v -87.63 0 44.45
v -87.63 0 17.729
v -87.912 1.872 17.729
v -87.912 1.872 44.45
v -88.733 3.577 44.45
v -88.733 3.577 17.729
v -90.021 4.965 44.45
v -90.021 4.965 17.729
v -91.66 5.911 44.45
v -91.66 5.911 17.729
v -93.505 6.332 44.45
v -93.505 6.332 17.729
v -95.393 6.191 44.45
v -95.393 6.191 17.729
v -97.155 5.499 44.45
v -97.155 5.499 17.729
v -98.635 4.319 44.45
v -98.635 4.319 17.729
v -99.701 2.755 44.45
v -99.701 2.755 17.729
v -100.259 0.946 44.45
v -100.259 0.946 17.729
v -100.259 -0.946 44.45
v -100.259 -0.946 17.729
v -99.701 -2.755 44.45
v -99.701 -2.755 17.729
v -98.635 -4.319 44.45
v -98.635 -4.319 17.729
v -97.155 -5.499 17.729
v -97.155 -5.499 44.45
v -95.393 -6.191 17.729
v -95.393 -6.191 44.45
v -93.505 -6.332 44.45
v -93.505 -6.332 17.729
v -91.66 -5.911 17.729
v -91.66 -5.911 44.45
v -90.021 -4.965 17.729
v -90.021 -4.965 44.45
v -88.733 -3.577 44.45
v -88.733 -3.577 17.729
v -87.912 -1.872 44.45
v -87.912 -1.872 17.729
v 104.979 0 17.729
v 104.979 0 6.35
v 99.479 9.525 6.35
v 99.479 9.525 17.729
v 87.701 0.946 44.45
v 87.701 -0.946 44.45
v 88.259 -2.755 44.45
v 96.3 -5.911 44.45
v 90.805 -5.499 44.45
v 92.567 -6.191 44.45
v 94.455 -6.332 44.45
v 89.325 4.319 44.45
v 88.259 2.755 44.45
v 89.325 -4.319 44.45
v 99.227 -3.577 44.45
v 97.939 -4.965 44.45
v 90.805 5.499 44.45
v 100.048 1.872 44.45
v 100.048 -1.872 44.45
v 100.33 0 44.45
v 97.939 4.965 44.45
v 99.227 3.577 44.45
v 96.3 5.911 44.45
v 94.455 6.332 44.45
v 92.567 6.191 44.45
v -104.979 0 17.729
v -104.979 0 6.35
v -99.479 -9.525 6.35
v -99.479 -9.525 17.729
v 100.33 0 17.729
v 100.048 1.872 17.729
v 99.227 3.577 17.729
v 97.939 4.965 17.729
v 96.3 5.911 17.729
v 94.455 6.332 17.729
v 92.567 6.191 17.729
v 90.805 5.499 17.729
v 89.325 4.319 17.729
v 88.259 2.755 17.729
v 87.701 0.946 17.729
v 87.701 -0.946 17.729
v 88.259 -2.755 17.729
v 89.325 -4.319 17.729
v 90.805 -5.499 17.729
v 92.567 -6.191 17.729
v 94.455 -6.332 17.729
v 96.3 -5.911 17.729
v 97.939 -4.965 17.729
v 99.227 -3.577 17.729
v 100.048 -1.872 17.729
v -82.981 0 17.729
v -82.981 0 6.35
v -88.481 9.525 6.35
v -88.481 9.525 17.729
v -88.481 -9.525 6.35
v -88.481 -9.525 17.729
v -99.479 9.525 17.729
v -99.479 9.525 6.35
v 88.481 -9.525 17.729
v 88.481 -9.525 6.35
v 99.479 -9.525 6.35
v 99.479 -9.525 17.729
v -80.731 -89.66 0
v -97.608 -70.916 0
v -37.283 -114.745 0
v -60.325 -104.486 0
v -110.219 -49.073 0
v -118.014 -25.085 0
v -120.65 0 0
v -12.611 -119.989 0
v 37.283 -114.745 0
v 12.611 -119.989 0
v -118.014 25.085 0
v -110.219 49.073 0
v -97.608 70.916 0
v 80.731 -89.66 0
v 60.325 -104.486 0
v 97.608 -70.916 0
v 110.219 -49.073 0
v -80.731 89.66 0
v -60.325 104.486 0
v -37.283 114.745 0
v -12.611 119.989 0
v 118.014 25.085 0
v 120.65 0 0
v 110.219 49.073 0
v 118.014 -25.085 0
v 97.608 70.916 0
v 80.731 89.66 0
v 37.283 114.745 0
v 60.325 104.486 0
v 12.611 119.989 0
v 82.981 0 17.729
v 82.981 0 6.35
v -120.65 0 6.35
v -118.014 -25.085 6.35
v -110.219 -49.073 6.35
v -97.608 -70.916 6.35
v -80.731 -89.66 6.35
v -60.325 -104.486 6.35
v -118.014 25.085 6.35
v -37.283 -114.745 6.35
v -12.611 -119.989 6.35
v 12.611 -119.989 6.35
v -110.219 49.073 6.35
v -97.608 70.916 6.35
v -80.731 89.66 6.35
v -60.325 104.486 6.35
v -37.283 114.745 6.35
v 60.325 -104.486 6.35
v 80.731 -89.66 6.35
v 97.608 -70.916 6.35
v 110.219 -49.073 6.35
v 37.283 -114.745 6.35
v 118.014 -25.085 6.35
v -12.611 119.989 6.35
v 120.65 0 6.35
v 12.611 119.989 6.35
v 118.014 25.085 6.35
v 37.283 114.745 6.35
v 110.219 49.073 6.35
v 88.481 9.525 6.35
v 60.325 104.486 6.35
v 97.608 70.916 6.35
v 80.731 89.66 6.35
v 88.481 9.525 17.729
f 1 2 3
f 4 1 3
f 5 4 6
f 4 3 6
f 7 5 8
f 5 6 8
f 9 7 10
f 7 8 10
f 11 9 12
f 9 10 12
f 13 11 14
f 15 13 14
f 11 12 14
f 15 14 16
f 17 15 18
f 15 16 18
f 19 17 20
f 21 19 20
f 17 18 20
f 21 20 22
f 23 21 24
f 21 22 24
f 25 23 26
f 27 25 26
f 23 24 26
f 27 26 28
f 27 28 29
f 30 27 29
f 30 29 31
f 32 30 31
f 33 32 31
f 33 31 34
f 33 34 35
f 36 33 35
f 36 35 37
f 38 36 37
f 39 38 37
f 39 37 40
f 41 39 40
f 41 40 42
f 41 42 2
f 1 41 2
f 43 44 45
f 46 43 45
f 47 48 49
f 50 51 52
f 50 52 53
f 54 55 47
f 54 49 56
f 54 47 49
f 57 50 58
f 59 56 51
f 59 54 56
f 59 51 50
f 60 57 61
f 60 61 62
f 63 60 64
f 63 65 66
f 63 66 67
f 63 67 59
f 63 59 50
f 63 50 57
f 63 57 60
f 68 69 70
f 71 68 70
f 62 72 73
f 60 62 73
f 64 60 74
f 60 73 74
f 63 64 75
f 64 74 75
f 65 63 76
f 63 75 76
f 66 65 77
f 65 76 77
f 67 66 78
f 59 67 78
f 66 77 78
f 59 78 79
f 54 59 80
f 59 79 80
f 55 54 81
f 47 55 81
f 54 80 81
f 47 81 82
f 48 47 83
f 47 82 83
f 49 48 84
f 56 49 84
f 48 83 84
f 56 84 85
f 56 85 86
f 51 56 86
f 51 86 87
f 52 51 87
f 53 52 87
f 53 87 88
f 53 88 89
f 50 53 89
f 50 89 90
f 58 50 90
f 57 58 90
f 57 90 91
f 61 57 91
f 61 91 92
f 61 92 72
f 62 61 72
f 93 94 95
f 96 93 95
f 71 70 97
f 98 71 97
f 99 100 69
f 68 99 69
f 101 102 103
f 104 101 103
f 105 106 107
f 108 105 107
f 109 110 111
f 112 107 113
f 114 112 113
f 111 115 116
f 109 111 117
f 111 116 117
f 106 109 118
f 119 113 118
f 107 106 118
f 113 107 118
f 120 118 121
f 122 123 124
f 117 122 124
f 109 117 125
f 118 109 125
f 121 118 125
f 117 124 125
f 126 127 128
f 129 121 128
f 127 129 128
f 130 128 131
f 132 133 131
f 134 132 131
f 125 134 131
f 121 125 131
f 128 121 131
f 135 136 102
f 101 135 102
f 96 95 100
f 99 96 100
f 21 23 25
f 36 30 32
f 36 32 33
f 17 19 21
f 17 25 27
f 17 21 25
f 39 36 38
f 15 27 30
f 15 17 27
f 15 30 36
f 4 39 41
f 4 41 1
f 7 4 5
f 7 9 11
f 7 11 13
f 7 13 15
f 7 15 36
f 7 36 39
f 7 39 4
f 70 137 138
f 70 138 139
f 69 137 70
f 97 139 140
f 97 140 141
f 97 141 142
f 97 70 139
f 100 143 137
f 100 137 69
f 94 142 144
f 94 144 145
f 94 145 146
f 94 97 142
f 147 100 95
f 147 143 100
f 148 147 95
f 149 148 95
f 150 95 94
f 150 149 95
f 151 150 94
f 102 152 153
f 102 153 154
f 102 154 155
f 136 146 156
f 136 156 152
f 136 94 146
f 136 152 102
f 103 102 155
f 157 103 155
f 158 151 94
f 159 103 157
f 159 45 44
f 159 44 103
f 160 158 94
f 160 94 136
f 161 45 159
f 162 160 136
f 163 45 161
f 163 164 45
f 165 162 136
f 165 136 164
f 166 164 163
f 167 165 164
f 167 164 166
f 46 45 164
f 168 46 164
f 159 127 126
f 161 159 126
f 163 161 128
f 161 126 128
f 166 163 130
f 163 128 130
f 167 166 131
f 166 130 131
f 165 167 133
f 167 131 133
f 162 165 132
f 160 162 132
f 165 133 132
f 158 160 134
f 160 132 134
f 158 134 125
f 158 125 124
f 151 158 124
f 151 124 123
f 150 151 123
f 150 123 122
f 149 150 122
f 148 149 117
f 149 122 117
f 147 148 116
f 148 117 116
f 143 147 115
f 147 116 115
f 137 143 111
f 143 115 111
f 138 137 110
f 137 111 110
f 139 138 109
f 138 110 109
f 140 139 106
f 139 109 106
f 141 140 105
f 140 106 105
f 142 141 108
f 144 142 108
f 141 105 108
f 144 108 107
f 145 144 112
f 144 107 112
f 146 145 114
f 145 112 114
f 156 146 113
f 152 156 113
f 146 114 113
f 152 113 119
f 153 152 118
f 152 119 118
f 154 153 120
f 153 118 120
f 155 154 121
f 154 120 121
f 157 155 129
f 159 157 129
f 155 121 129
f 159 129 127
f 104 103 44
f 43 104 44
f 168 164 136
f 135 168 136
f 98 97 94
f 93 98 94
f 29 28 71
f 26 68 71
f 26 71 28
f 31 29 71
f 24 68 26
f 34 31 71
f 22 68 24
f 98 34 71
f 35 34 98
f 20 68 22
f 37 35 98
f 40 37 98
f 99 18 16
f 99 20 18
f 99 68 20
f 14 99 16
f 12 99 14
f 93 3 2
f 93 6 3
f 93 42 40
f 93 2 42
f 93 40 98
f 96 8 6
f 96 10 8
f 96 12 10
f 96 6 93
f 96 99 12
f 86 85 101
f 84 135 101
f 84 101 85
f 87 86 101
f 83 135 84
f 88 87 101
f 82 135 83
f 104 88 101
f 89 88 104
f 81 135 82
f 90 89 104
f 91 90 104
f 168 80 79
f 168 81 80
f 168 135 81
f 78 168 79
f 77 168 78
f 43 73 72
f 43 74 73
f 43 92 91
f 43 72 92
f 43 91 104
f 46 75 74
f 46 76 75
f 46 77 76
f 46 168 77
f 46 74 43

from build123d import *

# Parameters (mm, degrees)
F0_R     = 120.65
F1_DEPTH = 6.35
F2_R     = 6.35
F3_DEPTH = 38.1
F4_R     = 6.35
F5_DEPTH = 11.3792


with BuildPart() as f1:
    # F0 (on Top) → F1 (new body)
    with BuildSketch(Plane.XY):
        Circle(F0_R)
    extrude(amount=F1_DEPTH)

    # F2 (on face) → F3 (join)
    with BuildSketch(Plane.XY.offset(6.35)):
        with Locations((-93.98, 0)):
            Circle(F2_R)
        with Locations((93.98, 0)):
            Circle(F2_R)
    extrude(amount=F3_DEPTH)

    # F4 (on face) → F5 (join)
    with BuildSketch(Plane.XY.offset(6.35)):
        Polygon((-88.480739, 9.525), (-99.479261, 9.525), (-104.978523, 0), (-99.479261, -9.525), (-88.480739, -9.525), (-82.981477, 0), align=None)
        with Locations((-93.98, 0)):
            Circle(F4_R, mode=Mode.SUBTRACT)
        Polygon((99.479261, 9.525), (88.480739, 9.525), (82.981477, 0), (88.480739, -9.525), (99.479261, -9.525), (104.978523, 0), align=None)
        with Locations((93.98, 0)):
            Circle(F4_R, mode=Mode.SUBTRACT)
    extrude(amount=F5_DEPTH)


solid = f1.part
